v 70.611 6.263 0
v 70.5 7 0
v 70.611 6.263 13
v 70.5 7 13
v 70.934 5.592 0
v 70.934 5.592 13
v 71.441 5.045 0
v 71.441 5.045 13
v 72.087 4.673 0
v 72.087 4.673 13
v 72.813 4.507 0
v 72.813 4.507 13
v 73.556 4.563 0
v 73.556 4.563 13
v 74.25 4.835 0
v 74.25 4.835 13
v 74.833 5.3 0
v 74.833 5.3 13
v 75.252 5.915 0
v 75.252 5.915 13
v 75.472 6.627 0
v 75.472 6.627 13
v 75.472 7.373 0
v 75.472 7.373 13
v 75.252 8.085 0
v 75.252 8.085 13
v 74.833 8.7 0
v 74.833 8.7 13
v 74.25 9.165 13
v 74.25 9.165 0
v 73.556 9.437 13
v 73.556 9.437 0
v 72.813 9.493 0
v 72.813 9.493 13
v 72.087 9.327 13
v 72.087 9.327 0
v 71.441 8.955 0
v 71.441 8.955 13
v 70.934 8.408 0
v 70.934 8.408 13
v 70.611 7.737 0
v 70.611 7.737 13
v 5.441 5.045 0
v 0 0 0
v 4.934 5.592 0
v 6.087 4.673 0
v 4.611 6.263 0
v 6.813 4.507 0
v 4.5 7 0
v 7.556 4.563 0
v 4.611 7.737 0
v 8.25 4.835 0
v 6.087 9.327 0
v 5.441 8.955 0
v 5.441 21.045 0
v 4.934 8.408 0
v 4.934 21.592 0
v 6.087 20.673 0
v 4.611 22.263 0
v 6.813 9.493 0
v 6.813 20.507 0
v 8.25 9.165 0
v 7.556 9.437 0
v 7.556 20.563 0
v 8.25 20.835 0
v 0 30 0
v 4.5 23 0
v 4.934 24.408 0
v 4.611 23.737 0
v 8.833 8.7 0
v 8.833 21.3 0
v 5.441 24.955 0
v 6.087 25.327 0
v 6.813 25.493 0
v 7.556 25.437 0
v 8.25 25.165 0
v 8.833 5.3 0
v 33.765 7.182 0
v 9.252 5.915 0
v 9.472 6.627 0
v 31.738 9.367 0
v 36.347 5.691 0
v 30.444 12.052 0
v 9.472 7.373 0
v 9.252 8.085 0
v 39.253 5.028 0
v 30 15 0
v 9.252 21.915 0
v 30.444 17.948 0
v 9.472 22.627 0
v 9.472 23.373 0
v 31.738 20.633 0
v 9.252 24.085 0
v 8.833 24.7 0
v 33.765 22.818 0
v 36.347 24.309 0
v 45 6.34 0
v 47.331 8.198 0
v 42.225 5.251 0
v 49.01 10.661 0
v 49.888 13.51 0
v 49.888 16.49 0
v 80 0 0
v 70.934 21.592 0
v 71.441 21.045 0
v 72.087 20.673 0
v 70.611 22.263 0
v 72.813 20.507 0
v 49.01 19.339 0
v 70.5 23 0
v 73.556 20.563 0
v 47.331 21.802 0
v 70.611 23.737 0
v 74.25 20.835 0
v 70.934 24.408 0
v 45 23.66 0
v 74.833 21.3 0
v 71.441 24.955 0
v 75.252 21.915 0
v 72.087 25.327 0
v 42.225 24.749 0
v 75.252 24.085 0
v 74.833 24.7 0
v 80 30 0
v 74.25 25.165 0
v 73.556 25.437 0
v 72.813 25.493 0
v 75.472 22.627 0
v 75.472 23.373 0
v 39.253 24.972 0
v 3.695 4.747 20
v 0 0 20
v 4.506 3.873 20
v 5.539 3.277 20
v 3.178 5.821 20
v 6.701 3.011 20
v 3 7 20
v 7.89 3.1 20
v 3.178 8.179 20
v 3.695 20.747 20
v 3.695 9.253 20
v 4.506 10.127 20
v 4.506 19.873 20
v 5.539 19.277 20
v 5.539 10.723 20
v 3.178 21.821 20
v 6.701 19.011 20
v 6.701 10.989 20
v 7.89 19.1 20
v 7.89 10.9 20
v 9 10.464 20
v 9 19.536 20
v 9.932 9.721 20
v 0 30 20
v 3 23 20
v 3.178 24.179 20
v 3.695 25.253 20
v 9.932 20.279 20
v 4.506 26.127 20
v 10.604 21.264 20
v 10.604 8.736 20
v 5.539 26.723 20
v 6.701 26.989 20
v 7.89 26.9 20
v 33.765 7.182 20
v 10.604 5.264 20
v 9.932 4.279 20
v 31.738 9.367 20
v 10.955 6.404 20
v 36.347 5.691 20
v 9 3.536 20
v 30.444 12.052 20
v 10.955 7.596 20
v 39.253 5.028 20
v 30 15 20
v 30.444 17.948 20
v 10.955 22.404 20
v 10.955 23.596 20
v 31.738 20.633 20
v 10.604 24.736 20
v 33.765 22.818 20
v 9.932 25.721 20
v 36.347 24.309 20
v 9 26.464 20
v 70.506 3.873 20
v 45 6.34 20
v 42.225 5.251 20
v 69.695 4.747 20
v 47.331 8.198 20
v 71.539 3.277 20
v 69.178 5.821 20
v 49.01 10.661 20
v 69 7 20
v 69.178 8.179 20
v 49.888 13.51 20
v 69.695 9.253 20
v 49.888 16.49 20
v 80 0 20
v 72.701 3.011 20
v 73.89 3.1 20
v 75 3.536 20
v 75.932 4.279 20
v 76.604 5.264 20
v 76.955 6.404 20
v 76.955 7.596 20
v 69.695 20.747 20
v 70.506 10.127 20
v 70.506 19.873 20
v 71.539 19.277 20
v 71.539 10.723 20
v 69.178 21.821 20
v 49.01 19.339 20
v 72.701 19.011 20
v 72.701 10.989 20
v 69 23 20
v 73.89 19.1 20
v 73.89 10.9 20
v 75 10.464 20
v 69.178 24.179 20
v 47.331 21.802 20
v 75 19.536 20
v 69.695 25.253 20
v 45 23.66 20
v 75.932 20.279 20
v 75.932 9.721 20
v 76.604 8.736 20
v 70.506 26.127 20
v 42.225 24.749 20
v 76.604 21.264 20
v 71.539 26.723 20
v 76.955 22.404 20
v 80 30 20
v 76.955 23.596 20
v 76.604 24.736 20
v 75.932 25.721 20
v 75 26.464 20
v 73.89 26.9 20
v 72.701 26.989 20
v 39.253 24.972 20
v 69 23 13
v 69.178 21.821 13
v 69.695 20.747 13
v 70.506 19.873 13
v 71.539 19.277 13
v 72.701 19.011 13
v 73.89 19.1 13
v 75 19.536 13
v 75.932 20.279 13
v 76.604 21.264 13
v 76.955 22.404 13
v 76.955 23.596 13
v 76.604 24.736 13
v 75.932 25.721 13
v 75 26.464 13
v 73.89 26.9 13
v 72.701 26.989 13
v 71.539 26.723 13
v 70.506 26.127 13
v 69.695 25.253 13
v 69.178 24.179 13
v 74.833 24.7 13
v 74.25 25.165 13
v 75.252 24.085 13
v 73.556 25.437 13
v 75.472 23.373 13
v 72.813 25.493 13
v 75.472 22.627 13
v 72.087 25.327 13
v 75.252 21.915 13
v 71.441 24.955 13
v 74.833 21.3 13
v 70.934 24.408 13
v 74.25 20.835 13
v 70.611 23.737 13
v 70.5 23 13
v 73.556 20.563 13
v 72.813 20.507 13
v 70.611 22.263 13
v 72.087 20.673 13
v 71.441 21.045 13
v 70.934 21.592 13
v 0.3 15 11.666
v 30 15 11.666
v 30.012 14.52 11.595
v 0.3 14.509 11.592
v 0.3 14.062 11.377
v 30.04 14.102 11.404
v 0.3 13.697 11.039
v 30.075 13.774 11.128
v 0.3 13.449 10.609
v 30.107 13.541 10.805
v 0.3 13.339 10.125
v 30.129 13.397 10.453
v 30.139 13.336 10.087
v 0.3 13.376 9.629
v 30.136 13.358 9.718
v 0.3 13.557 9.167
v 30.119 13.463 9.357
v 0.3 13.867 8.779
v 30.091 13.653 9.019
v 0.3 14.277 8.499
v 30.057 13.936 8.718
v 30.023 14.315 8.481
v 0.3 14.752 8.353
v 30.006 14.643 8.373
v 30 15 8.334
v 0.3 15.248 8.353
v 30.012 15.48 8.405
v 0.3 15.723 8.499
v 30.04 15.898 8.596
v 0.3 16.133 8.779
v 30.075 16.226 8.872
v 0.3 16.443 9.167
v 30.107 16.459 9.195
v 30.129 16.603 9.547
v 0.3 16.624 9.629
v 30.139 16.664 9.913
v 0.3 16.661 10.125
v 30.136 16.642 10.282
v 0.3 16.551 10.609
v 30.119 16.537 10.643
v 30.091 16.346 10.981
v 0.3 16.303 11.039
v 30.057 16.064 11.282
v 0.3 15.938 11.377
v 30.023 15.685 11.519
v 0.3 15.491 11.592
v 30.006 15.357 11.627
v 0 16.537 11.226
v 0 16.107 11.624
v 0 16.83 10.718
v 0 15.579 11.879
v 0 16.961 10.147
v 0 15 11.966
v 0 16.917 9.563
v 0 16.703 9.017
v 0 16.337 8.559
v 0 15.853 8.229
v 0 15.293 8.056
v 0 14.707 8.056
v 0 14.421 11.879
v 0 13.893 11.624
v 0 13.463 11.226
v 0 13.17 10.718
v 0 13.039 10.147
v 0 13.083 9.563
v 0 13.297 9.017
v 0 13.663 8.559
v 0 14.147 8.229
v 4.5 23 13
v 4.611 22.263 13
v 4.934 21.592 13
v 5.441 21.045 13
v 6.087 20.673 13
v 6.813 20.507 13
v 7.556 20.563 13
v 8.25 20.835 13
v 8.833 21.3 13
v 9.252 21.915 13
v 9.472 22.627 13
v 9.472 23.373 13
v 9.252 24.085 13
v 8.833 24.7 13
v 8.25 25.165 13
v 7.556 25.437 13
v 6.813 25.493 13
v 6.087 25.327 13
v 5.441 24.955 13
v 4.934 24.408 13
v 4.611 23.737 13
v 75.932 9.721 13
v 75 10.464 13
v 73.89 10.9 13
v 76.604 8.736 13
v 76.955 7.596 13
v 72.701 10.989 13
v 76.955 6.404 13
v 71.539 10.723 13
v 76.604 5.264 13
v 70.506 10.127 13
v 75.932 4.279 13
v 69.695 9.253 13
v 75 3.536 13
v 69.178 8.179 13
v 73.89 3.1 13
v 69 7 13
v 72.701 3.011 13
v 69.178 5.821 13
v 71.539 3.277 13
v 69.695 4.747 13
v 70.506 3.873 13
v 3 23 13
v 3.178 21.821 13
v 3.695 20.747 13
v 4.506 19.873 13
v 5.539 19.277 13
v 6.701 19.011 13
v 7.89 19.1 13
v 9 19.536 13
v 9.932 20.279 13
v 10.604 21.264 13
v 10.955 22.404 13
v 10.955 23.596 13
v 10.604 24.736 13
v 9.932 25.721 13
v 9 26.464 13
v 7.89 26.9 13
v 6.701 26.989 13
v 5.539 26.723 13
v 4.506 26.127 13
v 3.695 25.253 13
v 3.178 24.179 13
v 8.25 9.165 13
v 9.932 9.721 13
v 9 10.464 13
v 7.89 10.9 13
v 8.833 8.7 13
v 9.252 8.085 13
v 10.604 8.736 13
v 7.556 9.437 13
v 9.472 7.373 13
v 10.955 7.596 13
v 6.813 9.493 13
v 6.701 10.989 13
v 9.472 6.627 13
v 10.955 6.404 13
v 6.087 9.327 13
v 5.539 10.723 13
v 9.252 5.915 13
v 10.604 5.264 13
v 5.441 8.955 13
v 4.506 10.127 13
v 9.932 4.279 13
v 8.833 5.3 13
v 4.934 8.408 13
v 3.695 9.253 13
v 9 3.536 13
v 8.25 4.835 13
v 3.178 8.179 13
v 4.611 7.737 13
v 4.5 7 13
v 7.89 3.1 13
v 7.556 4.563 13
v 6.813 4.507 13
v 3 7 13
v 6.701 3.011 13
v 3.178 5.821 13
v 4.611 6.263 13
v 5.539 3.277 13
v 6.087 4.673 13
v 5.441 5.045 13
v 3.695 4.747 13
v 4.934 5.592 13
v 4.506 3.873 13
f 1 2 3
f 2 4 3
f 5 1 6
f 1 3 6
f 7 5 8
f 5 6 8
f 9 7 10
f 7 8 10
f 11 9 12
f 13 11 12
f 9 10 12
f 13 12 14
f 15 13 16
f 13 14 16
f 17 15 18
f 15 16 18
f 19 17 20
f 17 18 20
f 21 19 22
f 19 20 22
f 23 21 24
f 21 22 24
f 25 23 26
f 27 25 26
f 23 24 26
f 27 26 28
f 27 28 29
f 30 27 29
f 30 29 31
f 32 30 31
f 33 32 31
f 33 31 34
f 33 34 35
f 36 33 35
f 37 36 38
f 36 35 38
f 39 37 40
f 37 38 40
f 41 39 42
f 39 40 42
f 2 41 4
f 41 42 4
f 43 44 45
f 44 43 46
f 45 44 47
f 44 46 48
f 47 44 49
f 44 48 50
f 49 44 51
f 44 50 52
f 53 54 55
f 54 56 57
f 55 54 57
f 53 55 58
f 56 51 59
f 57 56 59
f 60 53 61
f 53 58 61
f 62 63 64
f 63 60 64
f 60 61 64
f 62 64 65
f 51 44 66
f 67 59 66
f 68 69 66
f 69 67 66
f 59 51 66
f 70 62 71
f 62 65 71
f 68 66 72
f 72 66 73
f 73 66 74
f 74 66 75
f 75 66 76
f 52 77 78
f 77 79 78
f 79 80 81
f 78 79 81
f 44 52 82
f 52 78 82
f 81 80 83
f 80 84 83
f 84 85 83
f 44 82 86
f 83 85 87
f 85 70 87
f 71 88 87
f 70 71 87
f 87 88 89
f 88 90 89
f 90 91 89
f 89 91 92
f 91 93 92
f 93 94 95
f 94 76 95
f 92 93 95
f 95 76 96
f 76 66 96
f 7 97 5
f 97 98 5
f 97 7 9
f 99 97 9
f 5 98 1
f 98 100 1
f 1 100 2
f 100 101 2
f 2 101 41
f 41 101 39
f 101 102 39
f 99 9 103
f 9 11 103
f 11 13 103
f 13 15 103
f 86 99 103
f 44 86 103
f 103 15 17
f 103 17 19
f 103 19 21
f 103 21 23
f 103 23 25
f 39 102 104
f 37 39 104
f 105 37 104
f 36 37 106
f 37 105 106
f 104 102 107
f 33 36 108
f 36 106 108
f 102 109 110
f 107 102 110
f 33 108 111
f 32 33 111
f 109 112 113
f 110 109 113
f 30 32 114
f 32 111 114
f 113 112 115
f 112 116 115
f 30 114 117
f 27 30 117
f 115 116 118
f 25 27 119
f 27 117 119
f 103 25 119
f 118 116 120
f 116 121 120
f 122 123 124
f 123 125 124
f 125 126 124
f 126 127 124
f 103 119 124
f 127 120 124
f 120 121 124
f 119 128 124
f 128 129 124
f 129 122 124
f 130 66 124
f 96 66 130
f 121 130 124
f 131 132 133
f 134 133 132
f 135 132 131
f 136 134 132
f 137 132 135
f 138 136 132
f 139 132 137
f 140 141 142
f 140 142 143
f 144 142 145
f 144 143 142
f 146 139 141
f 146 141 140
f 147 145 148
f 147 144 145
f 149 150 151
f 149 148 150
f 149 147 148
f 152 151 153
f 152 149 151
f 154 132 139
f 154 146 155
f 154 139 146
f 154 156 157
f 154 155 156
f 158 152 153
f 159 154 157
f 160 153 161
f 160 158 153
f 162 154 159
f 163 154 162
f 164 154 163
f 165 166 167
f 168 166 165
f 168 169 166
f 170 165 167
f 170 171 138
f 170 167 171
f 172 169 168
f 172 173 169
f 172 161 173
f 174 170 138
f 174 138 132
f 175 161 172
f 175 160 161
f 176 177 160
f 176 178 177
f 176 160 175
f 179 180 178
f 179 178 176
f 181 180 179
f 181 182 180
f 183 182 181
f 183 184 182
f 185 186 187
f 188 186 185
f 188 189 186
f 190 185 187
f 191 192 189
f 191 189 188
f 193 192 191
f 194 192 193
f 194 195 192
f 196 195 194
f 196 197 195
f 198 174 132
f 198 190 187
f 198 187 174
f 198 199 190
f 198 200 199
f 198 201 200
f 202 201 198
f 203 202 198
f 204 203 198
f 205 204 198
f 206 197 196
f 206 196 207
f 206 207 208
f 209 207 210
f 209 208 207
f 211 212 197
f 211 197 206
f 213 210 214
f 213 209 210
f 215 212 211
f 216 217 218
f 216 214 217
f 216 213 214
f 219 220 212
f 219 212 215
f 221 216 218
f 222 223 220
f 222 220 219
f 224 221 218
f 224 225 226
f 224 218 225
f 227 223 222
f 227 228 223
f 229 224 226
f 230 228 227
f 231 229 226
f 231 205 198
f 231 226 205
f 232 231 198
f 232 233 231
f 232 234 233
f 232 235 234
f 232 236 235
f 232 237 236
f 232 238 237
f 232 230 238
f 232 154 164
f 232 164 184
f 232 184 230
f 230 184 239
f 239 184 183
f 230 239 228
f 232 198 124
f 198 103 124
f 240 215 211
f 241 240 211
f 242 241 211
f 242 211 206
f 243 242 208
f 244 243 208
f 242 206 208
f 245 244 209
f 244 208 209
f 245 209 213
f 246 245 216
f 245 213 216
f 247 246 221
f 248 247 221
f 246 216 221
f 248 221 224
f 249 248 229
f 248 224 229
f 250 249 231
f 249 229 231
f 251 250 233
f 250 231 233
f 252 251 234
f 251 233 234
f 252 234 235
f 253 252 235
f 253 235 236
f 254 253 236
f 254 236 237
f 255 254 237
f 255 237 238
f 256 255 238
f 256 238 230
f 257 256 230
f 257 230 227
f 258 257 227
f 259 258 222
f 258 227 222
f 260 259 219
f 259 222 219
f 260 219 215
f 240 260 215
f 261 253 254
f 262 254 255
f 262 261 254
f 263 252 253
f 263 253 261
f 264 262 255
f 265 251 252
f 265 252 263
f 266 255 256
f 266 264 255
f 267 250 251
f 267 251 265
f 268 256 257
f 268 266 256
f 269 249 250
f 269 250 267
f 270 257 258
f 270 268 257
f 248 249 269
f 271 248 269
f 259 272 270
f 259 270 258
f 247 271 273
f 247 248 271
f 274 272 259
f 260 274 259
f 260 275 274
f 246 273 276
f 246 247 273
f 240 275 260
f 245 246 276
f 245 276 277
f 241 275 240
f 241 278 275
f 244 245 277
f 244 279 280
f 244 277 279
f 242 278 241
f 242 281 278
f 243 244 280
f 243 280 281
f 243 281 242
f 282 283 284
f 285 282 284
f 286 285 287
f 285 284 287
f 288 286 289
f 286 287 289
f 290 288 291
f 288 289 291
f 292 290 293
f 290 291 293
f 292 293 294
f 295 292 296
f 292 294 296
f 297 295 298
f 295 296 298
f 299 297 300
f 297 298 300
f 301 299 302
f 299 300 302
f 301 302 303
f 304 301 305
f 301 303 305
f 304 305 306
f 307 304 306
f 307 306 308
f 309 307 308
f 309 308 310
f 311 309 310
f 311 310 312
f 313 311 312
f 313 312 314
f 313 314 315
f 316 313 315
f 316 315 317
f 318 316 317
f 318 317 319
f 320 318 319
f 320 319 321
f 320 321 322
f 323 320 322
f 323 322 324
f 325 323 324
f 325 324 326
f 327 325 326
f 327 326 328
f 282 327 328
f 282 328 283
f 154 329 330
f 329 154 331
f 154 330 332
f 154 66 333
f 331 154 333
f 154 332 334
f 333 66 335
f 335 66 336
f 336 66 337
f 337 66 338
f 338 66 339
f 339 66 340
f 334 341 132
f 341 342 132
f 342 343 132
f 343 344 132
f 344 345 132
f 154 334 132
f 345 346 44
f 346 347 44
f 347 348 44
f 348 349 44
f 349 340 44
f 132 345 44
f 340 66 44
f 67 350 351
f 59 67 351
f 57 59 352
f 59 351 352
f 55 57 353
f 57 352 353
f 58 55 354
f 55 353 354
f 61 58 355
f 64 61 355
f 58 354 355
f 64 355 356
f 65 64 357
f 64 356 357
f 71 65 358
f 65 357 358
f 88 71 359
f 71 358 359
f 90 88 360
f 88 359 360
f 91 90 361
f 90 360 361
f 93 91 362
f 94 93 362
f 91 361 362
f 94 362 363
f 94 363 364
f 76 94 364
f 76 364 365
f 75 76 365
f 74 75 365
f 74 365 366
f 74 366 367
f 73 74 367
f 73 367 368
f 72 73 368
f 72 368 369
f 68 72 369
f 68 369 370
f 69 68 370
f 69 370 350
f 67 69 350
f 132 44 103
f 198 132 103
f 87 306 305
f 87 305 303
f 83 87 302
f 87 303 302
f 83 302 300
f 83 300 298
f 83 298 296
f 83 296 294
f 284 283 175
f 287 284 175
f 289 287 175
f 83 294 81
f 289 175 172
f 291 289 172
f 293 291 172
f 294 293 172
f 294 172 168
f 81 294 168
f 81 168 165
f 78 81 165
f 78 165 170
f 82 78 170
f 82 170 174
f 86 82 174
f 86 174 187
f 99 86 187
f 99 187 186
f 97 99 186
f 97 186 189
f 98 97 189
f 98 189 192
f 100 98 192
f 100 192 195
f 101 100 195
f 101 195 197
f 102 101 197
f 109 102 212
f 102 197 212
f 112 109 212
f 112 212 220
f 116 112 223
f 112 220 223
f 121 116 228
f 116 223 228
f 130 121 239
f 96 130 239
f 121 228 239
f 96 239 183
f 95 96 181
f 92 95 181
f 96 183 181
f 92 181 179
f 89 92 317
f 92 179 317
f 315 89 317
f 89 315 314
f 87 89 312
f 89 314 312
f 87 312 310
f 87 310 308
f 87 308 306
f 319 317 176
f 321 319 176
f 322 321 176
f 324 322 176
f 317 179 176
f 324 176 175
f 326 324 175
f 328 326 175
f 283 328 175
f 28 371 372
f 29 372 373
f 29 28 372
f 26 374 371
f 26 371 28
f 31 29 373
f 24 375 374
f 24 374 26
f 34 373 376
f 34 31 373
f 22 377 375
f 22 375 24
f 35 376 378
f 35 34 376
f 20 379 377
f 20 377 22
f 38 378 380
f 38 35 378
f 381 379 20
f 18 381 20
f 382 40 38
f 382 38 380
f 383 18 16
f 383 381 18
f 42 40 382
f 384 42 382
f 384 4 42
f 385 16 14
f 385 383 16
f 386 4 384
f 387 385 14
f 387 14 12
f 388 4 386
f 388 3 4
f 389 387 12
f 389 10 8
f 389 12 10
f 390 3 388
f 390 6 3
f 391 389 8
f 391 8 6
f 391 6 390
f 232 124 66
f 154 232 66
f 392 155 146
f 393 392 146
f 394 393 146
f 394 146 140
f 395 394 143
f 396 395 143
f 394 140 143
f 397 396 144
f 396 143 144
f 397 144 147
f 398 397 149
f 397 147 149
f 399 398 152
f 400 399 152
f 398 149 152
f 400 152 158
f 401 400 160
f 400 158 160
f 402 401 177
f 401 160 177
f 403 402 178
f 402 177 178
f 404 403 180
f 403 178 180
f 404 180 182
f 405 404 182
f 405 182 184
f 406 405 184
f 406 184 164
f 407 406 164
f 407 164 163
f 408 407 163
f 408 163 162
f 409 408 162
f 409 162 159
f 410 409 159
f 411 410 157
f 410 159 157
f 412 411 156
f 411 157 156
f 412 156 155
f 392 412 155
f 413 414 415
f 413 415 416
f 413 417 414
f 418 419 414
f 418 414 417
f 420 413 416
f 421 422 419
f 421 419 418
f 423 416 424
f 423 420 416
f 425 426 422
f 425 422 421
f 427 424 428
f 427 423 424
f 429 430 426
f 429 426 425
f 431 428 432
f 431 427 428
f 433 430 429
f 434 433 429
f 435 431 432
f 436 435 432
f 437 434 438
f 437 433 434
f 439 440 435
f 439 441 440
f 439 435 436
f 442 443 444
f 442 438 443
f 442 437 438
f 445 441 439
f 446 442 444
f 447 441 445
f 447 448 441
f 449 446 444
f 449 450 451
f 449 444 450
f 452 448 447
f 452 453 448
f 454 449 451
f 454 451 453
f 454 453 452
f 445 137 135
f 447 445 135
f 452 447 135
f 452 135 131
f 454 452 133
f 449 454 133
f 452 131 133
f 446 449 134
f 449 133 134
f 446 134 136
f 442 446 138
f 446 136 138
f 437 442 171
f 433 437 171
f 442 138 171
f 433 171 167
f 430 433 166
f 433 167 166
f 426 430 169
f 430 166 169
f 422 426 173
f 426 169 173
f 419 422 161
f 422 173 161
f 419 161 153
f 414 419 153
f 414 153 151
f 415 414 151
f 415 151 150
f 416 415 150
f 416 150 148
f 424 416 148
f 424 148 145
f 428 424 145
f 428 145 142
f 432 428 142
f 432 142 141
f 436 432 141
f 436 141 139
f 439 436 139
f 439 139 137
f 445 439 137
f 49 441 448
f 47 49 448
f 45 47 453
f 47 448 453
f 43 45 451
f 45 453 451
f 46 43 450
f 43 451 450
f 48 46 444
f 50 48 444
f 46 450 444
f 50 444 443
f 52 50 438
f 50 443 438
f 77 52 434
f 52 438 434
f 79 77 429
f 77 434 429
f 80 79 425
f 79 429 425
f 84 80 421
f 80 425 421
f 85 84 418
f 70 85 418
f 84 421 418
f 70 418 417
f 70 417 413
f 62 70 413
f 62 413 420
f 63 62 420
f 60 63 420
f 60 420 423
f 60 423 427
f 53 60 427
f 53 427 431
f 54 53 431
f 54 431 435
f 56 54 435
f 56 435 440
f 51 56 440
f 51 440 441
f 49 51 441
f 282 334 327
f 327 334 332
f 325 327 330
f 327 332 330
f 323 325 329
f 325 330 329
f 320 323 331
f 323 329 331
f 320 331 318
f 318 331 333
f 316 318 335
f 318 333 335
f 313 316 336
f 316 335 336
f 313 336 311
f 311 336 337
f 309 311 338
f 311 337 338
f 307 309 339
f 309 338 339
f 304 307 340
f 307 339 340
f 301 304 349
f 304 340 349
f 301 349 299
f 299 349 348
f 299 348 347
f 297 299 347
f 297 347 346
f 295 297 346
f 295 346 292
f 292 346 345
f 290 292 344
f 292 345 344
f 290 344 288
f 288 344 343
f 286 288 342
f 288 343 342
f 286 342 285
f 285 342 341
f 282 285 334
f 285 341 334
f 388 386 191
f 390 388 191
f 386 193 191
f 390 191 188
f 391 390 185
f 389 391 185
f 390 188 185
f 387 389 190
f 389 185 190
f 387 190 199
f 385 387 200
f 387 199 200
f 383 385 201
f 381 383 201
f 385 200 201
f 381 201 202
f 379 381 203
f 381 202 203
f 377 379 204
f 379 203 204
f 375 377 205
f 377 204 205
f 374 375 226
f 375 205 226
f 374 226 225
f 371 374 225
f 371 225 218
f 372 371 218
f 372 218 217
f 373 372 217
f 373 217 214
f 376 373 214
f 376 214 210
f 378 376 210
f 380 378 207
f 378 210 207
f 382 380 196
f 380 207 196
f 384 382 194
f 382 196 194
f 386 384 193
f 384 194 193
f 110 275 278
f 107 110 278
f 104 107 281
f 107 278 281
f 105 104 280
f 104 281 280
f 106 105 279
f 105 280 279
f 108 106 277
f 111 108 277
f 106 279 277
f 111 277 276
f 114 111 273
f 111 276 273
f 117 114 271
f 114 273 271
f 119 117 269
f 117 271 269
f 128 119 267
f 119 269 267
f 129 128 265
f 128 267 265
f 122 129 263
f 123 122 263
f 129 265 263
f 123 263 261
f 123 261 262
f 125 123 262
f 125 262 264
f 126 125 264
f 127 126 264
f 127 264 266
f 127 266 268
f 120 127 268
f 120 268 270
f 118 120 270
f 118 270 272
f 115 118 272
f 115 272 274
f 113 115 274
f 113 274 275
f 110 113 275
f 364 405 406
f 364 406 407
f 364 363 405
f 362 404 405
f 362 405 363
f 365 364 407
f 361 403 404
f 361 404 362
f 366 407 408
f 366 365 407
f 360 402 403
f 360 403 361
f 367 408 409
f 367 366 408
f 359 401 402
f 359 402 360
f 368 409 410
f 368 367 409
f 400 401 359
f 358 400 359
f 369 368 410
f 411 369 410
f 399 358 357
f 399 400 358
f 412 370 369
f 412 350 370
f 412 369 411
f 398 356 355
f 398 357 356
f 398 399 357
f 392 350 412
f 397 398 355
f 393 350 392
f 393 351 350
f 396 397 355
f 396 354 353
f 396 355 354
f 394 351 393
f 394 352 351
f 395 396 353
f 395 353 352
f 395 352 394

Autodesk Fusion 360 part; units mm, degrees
sketch "Skizze1" plane through (0, 0, 0) normal (0, 0, 1) x (1, 0, 0)
  line L0 (0, 0) -> (80, 0)
  line L1 (80, 0) -> (80, 30)
  line L2 (80, 30) -> (0, 30)
  line L3 (0, 30) -> (0, 0)
  dimension "d1" = 80
  dimension "d2" = 30
extrude "Extrusion1" add sketch "Skizze1" along normal blind 20
sketch "Skizze2" plane through (0, 0, 20) normal (0, 0, 1) x (-1, 0, 0)
  line L0 (0, -30) -> (0, 0)
  line L1 (0, 0) -> (-80, 0)
  line L2 (-80, 0) -> (-80, -30)
  line L3 (-80, -30) -> (0, -30)
  circle A0 centre (-40, -15) radius 10
  circle A1 centre (-7, -23) radius 2.5
  circle A2 centre (-7, -23) radius 4
  dimension "d5" = 20
  dimension "d6" = 40
  dimension "d7" = 15
  dimension "d8" = 5
  dimension "d9" = 8
  dimension "d10" = 7
  dimension "d11" = 7
extrude "Extrusion2" cut sketch "Skizze2" against normal blind 22 contours A0
ref_plane "Arbeitsebene1" through (40, 15, 10) normal (0, -1, 0) x (1, 0, 0)
extrude "Extrusion3" cut sketch "Skizze2" against normal blind 22 contours A1
extrude "Extrusion4" cut sketch "Skizze2" against normal blind 7 contours A2
pattern_linear "R-Anordnung1" count 2 spacing 16 along (0, -1, 0) count 2 spacing 66 along (1, 0, 0) of "Extrusion3", "Extrusion4"
sketch "Skizze3" plane through (0, 0, 0) normal (-1, 0, 0) x (0, -1, 0)
  line L0 (-30, 0) -> (0, 0)
  line L1 (0, 0) -> (0, 20)
  line L2 (0, 20) -> (-30, 20)
  line L3 (-30, 20) -> (-30, 0)
  circle A0 centre (-15, 10) radius 1.5
  dimension "d22" = 3
  dimension "d23" = 15
  dimension "d24" = 10
hole "Bohrung1" at (0, 15, 10) direction (1, 0, 0) diameter 3.332 depth 40 tip angle 118
chamfer "Fase3" distance 0.3 angle 45 1 edges at (0, 16.5533, 10.6025)
